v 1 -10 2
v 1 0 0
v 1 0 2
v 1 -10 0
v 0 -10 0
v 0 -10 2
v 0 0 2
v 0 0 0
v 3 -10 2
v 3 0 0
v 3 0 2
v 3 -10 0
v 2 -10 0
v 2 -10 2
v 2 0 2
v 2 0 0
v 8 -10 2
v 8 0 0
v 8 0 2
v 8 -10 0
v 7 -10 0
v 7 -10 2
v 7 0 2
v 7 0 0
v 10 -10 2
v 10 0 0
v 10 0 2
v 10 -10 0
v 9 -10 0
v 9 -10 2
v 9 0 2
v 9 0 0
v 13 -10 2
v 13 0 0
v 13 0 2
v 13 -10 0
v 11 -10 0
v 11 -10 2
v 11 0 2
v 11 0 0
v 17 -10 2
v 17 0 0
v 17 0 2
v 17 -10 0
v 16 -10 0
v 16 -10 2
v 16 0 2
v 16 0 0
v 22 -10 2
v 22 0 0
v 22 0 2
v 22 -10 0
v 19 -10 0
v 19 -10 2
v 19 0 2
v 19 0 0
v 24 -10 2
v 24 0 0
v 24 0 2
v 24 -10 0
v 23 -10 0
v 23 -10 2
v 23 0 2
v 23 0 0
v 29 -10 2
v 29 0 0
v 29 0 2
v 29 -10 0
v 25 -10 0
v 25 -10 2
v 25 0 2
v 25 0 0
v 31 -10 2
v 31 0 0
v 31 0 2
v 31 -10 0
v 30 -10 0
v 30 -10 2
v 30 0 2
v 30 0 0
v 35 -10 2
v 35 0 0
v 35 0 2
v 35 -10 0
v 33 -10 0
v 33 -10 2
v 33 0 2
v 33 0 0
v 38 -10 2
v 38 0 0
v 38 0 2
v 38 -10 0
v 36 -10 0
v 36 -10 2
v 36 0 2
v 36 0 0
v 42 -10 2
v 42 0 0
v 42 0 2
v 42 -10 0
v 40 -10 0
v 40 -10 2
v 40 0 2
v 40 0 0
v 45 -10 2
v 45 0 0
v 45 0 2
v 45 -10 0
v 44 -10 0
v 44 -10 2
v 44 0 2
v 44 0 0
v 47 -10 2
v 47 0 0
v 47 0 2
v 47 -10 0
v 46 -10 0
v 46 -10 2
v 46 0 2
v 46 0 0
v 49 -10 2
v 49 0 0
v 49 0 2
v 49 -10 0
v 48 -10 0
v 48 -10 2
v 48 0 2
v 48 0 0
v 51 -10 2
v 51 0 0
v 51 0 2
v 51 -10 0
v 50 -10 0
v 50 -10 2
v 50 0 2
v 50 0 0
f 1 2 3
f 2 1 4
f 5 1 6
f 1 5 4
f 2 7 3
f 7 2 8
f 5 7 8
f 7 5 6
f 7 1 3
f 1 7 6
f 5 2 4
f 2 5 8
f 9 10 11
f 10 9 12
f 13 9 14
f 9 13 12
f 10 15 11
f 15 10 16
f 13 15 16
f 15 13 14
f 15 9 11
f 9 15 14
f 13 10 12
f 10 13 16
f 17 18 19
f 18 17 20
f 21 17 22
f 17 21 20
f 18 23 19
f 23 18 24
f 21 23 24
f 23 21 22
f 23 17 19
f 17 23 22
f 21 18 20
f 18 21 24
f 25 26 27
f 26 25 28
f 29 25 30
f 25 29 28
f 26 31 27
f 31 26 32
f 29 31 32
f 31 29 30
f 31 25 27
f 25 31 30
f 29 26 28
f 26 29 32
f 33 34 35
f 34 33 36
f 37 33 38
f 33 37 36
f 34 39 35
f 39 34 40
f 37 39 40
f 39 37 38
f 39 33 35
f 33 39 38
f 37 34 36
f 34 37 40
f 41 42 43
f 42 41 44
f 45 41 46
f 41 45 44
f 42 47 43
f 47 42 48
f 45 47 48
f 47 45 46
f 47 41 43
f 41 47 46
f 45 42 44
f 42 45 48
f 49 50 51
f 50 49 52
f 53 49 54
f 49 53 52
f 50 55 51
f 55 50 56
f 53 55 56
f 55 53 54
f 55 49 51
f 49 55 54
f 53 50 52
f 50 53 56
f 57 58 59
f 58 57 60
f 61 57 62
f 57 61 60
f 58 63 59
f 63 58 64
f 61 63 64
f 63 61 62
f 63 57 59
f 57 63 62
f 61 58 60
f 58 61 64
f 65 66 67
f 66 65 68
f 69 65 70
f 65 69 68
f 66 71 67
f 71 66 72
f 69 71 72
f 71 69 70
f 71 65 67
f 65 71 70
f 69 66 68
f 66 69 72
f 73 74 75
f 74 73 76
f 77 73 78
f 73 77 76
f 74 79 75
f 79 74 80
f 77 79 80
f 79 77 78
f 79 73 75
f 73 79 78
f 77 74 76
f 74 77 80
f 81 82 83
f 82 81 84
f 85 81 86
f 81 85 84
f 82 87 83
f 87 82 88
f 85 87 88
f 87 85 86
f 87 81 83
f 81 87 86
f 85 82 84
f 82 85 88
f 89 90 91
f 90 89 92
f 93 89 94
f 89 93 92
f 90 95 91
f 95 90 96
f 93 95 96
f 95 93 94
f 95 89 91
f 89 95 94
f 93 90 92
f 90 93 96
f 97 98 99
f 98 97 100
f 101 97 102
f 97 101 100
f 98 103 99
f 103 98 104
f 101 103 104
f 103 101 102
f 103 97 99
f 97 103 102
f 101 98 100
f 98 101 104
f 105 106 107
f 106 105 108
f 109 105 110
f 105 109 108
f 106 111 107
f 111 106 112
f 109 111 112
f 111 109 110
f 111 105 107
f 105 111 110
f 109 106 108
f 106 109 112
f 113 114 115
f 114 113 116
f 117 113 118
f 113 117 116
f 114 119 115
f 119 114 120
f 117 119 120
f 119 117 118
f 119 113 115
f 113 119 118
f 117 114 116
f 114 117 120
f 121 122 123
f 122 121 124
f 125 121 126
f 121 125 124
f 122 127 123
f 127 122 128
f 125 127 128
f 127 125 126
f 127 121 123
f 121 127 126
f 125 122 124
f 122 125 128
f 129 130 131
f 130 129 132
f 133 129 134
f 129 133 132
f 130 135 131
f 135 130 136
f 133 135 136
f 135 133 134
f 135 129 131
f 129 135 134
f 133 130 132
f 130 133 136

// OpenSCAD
use <barcodes.scad>

rotate([90, 0, 0])
    barcode(654321,10,1,0);
